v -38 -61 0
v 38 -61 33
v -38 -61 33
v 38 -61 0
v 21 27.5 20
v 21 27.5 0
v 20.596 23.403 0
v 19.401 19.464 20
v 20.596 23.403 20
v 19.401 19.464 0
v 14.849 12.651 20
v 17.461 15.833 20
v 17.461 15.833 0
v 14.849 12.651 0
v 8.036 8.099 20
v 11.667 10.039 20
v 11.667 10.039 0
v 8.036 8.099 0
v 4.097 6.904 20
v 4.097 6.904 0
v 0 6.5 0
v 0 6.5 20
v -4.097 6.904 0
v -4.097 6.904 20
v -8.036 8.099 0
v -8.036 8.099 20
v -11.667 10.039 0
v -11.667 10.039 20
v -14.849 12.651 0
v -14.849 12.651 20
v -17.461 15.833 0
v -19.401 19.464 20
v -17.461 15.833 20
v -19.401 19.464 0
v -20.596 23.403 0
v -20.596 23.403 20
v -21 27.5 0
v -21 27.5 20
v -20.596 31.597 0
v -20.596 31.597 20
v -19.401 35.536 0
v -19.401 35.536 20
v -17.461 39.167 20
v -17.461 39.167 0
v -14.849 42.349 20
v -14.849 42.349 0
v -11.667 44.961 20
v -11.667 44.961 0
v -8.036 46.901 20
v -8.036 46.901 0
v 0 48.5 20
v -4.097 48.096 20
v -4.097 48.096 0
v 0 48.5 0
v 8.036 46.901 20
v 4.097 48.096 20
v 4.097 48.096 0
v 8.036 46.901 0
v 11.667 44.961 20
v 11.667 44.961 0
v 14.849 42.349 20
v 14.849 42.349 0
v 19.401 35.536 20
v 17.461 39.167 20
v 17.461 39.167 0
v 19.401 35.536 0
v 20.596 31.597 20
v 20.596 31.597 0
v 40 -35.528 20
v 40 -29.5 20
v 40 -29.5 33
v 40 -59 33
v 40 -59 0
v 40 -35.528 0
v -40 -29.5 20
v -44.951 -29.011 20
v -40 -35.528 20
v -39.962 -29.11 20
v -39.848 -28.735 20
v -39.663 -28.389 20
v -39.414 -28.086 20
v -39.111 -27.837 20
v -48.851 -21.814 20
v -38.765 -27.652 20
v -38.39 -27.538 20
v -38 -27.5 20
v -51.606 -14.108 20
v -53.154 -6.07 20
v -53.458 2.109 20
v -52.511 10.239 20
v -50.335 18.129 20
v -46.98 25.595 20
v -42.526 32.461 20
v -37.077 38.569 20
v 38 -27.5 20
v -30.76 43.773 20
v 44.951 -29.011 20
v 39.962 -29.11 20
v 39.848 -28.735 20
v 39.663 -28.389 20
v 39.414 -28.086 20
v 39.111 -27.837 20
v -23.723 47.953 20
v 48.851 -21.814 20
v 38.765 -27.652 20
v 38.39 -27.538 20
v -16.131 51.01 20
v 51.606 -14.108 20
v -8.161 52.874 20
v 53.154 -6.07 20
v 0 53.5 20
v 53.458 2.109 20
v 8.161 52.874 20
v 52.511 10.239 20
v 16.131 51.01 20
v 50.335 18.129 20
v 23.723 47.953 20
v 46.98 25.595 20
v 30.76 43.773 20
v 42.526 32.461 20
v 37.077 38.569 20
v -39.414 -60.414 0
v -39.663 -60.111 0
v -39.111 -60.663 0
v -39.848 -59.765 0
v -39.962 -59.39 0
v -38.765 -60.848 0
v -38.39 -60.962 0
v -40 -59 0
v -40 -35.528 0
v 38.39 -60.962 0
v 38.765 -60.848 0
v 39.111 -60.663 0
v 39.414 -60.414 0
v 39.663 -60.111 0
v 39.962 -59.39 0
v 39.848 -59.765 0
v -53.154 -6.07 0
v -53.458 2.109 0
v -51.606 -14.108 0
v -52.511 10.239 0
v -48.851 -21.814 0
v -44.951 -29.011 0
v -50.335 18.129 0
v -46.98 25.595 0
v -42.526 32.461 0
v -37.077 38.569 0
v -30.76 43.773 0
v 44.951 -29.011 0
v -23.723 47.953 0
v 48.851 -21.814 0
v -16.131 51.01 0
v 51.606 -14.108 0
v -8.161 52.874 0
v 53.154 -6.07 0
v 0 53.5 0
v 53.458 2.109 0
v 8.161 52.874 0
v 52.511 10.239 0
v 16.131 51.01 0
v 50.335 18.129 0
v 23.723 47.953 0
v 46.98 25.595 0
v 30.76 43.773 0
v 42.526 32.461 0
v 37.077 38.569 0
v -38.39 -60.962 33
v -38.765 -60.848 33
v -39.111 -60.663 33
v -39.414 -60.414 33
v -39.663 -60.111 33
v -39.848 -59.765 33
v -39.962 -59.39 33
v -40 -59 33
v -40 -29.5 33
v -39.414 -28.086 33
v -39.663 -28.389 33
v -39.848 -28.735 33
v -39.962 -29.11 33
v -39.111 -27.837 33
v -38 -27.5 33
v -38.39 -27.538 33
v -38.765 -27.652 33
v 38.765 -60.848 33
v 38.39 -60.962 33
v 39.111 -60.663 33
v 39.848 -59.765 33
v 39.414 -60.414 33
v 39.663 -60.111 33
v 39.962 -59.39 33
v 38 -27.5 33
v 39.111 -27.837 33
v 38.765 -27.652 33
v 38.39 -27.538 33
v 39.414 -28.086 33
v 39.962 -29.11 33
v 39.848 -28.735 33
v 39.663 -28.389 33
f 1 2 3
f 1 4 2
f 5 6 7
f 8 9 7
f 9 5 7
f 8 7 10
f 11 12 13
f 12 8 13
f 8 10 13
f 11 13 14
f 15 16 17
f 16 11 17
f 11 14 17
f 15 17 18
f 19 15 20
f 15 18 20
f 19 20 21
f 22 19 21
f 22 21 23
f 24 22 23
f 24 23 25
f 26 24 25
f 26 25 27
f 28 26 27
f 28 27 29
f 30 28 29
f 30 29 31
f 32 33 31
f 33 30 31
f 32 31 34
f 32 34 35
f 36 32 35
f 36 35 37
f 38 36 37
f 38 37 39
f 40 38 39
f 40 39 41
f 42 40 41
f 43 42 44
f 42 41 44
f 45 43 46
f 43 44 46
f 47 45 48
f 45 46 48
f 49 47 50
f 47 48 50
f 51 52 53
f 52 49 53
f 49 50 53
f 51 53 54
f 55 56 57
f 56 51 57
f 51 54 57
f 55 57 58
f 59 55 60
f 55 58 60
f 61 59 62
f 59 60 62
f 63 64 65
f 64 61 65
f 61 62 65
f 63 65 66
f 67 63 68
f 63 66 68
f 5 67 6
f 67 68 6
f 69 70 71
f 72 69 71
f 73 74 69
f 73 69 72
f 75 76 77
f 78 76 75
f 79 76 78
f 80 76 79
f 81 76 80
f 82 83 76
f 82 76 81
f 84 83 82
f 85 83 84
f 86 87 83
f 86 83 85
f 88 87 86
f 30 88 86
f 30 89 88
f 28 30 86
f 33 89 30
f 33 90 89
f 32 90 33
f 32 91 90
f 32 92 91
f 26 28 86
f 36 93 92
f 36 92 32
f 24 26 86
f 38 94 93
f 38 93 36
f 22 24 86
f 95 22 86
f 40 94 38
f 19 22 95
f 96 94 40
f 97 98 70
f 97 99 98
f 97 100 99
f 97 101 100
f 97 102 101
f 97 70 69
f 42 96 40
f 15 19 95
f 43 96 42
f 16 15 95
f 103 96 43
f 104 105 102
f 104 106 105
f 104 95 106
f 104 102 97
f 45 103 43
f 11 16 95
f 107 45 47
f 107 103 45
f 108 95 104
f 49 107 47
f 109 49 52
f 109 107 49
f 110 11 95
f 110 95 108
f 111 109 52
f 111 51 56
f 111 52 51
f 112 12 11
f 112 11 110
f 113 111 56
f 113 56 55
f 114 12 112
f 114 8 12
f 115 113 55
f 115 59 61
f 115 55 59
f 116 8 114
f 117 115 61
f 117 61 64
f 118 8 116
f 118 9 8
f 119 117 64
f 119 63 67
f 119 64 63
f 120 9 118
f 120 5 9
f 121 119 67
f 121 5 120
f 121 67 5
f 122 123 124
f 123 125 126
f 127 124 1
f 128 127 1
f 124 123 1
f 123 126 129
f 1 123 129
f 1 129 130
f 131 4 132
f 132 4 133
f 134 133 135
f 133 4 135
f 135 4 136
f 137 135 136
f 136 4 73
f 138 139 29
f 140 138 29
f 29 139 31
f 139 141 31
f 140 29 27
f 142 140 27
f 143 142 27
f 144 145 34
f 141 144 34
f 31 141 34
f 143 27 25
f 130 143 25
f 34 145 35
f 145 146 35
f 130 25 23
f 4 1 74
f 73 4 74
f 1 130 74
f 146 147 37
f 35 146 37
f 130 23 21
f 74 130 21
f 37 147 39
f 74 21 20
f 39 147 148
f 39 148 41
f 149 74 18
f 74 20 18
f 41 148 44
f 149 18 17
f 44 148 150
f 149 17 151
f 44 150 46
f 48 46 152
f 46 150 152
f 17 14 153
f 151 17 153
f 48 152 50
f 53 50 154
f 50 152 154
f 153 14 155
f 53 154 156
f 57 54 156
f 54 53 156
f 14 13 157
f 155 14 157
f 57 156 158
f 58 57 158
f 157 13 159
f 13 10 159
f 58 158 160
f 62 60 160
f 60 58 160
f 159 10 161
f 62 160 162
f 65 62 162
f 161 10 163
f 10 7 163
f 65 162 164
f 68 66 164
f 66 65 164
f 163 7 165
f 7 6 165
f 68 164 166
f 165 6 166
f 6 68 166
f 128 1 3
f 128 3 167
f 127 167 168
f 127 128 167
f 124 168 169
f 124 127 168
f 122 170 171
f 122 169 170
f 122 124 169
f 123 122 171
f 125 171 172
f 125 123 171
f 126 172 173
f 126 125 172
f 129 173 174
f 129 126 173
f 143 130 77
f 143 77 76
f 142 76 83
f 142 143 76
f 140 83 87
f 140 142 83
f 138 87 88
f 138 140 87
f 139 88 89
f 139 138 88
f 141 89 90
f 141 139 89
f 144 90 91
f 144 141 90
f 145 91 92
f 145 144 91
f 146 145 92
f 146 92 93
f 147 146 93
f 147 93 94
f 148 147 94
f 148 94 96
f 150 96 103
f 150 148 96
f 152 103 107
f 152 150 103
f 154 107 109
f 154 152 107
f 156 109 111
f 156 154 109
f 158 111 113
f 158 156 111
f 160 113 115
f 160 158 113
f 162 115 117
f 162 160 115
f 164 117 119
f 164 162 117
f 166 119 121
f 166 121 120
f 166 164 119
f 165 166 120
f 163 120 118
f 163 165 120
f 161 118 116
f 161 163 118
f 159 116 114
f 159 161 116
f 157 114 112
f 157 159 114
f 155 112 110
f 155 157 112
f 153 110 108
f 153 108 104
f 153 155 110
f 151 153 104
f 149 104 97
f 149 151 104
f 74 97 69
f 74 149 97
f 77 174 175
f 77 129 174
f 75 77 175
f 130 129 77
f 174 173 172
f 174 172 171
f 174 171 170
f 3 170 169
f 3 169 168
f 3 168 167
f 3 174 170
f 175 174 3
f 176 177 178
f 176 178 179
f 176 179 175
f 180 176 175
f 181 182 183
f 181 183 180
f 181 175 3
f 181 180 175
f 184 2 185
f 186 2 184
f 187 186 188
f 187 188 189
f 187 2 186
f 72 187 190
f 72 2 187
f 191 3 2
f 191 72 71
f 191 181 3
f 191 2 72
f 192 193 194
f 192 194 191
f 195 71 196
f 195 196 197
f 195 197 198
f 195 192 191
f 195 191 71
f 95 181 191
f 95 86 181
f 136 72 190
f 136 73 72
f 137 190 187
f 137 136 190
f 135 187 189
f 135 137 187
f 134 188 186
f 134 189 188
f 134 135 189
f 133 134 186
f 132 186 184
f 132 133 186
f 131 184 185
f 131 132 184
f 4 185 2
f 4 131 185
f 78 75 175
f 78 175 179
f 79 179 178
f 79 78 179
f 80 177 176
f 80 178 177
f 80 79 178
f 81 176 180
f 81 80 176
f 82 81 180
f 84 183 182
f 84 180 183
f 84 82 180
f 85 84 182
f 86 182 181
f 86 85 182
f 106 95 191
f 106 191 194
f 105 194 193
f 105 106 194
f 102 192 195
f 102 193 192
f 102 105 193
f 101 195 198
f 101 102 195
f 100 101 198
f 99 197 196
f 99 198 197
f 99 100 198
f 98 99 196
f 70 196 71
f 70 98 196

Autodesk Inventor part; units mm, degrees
ref_plane "YZ Plane" through (0, 0, 0) normal (1, 0, 0) x (0, 1, 0)
ref_plane "XZ Plane" through (0, 0, 0) normal (0, 1, 0) x (-1, 0, 0)
ref_plane "XY Plane" through (0, 0, 0) normal (0, 0, 1) x (1, 0, 0)
sketch "Sketch1" plane through (0, 0, 0) normal (0, 0, 1) x (1, 0, 0)
  circle A0 centre (0, 0) radius 53.5
  line L0 (38, -61) -> (-38, -61)
  line L1 (-40, -59) -> (-40, -35.5282)
  line L2 (40, -61) -> (-40, 61) construction
  line L3 (-40, -61) -> (40, 61) construction
  circle A1 centre (0, 27.5) radius 21
  line L4 (40, -35.5282) -> (40, -59)
  arc A2 (-40, -59) -> (-38, -61) centre (-38, -59) ccw
  arc A3 (38, -61) -> (40, -59) centre (38, -59) ccw
  dimension "d0" = 107
  dimension "d3" = 42
  dimension "d4" = 27.5
  dimension "d5" = 61
  dimension "d7" = 80
  dimension "d8" = 2
extrude "Extrusion1" add sketch "Sketch1" along normal blind 20
sketch "Sketch2" plane through (0, 0, 20) normal (0, 0, 1) x (1, 0, 0)
  line L0 (38, -61) -> (-38, -61)
  line L1 (-40, -59) -> (-40, -29.5)
  line L2 (-38, -27.5) -> (38, -27.5)
  line L3 (40, -29.5) -> (40, -59)
  arc A0 (-38, -27.5) -> (-40, -29.5) centre (-38, -29.5) ccw
  arc A1 (40, -29.5) -> (38, -27.5) centre (38, -29.5) ccw
  arc A2 (38, -61) -> (40, -59) centre (38, -59) ccw
  arc A3 (-40, -59) -> (-38, -61) centre (-38, -59) ccw
  point P0 (0, 0)
  point P1 (-40, -27.5)
  point P2 (-40, -61)
  point P3 (40, -27.5)
  dimension "d11" = 80
  dimension "d12" = 33.5
  dimension "d13" = 2
extrude "Extrusion2" add sketch "Sketch2" along normal blind 13
properties part number "ZWO-EFW-Mini" material "Steel"
